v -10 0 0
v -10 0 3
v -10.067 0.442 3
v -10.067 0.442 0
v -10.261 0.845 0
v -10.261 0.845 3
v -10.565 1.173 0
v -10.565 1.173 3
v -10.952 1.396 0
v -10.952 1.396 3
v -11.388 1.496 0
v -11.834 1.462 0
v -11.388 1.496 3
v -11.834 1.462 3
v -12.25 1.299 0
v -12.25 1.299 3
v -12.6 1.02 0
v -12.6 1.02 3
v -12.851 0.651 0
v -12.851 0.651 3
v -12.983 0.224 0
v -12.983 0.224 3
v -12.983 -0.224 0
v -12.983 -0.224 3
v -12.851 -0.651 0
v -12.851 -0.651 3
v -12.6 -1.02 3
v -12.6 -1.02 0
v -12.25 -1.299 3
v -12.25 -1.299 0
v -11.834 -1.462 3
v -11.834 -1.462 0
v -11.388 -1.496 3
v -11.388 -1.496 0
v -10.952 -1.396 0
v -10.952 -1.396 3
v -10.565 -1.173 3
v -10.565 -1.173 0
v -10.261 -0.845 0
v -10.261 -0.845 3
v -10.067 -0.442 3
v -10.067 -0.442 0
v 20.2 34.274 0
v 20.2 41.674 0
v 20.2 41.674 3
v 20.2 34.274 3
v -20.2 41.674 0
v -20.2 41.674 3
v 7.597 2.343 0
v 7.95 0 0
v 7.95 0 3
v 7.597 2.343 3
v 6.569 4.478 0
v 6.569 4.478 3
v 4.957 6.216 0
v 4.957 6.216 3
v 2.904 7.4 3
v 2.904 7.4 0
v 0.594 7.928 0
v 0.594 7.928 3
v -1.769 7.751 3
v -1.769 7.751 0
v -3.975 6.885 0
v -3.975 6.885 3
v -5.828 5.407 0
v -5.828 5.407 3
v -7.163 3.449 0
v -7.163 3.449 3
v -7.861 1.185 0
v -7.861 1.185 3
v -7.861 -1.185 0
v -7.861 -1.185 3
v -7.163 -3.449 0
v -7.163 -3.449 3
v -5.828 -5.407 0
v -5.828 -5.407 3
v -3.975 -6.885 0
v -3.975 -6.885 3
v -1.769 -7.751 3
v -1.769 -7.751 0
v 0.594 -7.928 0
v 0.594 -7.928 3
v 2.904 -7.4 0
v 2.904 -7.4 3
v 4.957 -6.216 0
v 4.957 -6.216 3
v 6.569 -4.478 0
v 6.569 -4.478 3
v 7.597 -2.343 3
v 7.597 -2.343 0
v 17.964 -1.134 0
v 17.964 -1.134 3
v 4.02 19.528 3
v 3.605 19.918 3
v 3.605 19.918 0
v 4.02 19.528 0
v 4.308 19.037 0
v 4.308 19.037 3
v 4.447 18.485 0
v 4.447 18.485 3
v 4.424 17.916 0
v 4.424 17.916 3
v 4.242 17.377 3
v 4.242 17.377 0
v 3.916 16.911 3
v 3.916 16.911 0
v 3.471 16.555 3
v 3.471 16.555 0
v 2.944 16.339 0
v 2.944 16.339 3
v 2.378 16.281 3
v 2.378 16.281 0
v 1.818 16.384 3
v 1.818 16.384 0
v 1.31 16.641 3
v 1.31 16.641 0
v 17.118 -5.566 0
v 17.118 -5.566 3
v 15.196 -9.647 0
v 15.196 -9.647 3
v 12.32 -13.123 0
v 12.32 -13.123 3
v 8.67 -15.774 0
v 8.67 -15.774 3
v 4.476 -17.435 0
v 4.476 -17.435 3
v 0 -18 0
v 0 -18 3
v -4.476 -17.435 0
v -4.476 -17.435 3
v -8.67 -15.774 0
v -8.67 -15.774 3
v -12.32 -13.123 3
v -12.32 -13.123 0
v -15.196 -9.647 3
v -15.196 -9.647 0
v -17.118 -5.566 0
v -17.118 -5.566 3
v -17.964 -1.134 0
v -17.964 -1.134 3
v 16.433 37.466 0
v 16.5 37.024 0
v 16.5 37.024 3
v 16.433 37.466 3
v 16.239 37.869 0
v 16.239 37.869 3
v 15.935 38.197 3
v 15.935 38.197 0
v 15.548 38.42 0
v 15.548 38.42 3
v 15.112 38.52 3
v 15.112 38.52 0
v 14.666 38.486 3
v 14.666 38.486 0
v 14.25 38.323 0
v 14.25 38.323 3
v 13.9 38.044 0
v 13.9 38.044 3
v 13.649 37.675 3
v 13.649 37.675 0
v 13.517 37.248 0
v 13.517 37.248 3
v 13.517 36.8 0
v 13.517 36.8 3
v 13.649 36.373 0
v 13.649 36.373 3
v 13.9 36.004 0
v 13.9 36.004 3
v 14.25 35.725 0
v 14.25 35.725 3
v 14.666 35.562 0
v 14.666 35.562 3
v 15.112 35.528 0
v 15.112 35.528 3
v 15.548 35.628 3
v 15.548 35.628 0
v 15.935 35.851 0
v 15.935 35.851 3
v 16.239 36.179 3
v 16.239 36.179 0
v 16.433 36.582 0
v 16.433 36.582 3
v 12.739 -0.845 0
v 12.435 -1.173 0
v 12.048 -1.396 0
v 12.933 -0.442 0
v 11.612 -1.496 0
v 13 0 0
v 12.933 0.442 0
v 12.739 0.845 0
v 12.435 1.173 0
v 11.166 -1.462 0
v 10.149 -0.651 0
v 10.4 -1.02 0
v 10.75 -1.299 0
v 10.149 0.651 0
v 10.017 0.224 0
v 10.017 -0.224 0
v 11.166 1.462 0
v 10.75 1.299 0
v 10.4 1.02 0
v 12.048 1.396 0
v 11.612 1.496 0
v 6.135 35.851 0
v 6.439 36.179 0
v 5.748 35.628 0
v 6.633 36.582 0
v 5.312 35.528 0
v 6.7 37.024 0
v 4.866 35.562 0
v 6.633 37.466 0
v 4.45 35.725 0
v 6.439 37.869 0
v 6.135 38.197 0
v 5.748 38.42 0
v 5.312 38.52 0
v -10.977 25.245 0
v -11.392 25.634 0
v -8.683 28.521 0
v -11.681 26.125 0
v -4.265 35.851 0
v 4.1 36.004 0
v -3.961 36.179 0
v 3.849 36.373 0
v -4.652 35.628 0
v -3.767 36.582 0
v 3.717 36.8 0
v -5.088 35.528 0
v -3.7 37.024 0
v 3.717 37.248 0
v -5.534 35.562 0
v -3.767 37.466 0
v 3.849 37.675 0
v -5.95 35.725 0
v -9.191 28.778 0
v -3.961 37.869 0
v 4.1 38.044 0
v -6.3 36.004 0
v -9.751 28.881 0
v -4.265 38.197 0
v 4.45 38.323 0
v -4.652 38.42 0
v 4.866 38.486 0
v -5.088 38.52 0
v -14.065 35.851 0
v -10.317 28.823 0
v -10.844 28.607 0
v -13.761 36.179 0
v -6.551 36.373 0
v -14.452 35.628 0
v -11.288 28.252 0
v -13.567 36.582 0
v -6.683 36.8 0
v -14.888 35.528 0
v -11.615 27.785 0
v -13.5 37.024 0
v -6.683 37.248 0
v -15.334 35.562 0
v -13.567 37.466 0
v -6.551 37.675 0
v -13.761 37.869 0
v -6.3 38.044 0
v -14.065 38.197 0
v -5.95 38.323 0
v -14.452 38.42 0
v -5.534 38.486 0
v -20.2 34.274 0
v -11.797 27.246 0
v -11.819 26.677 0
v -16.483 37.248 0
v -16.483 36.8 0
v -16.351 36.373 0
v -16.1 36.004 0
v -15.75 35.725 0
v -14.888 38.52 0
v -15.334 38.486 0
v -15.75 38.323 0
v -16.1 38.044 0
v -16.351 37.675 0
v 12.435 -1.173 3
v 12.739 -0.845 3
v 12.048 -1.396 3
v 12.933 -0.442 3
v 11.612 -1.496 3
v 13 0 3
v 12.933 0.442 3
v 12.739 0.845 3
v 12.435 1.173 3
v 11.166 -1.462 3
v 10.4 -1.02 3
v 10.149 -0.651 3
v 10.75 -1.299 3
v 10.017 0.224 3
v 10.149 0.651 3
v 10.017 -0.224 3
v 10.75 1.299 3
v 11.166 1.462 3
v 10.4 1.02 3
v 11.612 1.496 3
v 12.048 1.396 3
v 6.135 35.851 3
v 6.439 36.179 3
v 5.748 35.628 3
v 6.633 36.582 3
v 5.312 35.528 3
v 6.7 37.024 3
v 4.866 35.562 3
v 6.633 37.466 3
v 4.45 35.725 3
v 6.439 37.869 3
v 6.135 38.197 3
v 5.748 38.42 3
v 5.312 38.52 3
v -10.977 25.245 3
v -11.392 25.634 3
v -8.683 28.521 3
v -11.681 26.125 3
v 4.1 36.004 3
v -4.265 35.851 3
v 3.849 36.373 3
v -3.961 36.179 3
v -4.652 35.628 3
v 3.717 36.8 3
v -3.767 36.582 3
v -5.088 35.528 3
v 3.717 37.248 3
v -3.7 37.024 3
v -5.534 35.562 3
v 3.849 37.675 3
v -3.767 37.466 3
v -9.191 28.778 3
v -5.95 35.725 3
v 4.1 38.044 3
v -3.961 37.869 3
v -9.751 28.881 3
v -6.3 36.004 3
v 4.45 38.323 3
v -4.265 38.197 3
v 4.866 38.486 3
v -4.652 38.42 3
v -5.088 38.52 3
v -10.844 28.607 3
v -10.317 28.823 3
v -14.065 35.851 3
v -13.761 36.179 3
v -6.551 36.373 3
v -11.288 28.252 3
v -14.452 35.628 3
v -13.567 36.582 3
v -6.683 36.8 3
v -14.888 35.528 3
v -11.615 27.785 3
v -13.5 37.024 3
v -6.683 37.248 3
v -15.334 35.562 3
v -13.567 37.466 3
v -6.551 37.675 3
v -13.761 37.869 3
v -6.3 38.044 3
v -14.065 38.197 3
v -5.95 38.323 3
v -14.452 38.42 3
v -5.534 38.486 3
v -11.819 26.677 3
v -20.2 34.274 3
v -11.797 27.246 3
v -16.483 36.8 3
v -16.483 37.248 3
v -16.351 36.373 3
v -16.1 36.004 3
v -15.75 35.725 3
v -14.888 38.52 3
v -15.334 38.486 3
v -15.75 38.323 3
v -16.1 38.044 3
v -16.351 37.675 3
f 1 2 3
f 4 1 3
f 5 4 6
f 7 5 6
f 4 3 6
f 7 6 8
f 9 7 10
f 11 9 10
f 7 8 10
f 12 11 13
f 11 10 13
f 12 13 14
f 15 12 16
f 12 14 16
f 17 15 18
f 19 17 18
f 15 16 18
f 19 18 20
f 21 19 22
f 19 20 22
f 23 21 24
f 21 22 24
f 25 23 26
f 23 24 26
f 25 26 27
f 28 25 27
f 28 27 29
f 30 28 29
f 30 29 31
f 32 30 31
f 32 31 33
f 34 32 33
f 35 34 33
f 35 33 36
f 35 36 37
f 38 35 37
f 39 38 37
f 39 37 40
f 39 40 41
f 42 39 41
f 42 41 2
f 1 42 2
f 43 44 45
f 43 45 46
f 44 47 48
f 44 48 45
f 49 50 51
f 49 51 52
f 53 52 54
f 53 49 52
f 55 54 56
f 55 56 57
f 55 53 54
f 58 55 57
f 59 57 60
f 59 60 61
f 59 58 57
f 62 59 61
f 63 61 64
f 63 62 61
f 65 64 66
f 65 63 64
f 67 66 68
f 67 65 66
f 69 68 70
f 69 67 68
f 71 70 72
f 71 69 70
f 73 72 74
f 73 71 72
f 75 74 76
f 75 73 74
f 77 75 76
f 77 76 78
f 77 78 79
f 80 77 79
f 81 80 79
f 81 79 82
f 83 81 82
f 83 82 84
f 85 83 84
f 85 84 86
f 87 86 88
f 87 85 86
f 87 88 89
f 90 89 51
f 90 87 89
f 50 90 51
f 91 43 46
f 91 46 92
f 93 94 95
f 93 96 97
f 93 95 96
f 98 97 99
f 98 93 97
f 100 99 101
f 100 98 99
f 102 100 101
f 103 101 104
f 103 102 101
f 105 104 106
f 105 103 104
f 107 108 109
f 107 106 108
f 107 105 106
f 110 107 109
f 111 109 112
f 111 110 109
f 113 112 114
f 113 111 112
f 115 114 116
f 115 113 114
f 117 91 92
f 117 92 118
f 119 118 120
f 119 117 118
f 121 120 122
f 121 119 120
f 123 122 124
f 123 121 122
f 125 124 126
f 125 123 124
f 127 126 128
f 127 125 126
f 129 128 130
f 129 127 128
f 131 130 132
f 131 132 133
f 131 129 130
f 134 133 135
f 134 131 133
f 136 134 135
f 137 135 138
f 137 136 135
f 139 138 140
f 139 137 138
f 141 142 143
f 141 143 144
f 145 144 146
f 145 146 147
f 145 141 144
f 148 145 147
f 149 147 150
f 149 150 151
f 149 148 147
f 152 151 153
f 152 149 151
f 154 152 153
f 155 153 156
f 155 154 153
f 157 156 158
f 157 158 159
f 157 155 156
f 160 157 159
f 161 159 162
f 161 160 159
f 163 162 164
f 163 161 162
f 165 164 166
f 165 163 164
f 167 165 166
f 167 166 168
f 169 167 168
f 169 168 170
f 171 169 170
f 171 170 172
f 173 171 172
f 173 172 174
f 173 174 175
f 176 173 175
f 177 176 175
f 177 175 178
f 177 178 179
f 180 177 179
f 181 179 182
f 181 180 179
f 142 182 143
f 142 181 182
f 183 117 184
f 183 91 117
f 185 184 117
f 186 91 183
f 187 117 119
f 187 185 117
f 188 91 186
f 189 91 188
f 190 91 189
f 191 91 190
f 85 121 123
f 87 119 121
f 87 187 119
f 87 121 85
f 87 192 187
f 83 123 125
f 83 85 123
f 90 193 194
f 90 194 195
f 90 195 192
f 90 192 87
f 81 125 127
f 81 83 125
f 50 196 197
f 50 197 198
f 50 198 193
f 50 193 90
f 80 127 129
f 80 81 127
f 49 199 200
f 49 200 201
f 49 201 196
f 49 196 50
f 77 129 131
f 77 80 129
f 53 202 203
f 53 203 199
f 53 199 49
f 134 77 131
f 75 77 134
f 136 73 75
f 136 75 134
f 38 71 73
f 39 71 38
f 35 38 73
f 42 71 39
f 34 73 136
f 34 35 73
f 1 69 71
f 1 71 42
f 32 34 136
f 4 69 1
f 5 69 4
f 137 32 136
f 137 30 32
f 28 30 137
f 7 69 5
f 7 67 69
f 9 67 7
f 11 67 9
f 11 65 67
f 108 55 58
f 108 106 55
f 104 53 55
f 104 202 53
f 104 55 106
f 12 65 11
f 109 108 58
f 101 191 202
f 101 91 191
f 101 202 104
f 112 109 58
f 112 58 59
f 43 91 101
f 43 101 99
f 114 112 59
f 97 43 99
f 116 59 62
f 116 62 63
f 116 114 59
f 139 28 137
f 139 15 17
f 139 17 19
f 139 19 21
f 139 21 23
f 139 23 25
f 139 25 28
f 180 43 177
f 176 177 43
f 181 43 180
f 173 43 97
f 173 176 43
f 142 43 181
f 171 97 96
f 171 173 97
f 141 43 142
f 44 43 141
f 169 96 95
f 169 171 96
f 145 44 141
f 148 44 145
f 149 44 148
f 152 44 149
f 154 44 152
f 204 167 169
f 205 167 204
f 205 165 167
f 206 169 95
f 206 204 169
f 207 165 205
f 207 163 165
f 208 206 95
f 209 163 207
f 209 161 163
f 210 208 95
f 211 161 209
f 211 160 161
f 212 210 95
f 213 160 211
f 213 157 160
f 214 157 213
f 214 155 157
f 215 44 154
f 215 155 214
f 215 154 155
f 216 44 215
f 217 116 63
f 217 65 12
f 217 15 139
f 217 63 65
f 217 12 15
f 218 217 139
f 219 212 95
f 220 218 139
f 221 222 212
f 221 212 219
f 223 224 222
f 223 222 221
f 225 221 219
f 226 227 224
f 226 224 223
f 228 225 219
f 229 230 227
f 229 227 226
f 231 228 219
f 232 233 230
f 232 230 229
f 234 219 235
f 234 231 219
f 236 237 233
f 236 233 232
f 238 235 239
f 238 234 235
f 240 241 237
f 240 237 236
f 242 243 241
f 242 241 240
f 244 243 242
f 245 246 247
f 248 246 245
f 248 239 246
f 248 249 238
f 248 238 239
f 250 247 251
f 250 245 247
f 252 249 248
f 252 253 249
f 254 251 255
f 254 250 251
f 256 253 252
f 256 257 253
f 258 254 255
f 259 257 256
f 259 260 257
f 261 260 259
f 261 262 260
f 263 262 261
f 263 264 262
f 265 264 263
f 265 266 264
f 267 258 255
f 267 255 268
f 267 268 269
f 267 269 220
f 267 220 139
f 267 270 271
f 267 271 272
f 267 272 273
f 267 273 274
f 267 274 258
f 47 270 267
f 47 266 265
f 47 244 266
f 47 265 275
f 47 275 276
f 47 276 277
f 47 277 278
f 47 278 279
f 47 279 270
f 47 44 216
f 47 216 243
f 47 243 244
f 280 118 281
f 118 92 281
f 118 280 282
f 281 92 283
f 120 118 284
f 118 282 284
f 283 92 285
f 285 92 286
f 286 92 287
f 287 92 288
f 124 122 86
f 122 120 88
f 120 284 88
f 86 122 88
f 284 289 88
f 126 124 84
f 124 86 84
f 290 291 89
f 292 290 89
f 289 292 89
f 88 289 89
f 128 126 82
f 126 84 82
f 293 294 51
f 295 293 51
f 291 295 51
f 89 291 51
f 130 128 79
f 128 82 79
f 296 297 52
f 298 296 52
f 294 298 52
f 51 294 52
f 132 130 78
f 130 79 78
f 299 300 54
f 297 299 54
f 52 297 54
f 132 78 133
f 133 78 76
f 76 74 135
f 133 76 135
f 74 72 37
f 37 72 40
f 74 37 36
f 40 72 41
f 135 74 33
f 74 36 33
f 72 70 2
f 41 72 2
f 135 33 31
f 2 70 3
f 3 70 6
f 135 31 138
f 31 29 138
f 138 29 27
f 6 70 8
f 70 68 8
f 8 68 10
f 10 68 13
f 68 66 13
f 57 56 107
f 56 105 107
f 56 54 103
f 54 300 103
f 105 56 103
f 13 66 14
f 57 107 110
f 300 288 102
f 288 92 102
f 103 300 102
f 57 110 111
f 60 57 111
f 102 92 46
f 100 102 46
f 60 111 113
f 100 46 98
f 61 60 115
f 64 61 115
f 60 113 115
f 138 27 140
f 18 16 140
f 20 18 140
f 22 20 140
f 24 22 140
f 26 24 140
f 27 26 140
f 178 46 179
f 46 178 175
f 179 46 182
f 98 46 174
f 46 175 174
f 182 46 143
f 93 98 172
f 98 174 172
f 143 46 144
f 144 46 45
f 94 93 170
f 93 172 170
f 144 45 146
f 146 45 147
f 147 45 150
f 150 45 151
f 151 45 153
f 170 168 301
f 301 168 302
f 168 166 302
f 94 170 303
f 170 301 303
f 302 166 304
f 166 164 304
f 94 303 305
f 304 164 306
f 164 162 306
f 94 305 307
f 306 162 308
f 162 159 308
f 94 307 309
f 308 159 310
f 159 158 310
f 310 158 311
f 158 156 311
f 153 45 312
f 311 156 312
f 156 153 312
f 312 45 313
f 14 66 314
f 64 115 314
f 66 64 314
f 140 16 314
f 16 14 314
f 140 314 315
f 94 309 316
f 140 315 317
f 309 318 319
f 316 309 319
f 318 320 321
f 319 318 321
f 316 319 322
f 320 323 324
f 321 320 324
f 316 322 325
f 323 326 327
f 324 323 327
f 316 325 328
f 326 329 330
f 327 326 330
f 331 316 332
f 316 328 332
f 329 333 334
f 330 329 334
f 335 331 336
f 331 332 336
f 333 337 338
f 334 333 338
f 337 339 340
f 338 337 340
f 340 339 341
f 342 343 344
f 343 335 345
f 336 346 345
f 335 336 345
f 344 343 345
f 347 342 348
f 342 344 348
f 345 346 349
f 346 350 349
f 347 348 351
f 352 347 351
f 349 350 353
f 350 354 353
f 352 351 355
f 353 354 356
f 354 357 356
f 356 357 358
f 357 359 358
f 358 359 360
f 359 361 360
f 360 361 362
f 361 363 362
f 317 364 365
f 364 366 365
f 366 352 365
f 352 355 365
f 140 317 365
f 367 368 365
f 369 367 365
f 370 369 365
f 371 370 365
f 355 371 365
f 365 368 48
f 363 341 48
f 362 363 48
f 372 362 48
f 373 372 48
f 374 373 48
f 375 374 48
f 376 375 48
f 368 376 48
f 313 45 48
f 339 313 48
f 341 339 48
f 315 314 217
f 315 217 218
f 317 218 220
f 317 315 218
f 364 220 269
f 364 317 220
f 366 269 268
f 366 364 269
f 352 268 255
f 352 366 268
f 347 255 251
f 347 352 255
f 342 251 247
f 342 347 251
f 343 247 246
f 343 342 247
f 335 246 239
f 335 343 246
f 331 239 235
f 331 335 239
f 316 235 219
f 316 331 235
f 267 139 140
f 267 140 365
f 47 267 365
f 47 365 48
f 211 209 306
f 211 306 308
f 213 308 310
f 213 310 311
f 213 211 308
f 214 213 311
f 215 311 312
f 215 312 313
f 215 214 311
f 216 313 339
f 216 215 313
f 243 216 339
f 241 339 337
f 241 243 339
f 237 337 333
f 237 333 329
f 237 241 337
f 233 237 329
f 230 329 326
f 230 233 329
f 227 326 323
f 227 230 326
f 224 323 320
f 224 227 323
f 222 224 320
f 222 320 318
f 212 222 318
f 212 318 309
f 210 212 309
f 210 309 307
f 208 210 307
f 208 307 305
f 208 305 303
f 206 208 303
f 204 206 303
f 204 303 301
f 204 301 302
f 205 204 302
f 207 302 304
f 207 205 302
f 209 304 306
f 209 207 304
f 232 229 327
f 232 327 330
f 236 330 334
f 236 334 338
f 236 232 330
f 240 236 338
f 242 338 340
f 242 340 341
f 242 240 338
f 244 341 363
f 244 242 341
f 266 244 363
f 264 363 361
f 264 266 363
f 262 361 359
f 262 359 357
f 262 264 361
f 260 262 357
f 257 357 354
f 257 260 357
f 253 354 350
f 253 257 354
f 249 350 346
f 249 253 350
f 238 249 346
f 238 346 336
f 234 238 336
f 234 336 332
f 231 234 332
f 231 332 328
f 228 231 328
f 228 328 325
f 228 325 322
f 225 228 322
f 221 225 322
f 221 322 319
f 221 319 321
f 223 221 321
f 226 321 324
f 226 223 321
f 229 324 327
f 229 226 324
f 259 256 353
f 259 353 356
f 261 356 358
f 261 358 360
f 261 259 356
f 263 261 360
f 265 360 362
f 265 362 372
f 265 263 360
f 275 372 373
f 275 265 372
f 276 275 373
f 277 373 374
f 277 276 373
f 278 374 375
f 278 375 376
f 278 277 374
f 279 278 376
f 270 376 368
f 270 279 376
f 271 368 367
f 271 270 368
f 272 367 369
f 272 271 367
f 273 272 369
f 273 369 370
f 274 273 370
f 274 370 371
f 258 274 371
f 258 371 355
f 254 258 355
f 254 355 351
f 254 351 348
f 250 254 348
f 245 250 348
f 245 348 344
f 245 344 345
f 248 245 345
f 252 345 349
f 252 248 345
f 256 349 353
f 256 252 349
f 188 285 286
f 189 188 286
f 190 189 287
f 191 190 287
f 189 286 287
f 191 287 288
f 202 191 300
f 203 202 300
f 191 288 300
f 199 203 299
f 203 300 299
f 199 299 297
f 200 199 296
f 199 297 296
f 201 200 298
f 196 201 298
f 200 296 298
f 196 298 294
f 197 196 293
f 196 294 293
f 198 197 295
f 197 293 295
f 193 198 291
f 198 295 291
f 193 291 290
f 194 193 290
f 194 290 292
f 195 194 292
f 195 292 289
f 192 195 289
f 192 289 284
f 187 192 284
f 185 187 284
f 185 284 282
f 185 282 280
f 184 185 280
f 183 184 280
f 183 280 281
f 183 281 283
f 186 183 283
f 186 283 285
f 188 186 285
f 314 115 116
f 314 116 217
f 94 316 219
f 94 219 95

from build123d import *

# Parameters (mm, degrees)
SKETCH1_R               = 7.95
SKETCH1_R_2             = 1.5
MAIN_BODY_LINK_B2_DEPTH = 3
CUT_EXTRUDE1_REACH      = 48.409
SKETCH2_R               = 1.5
CUT_EXTRUDE2_DEPTH      = 47.408691448


with BuildPart() as part:
    # Sketch1 → Main Body Link B2 (new body)
    with BuildSketch(Plane.XY):
        with BuildLine():
            Line((0, 41.674052381), (20.2, 41.674052381))
            Line((20.2, 41.674052381), (20.2, 34.274052381))
            Line((20.2, 34.274052381), (17.964224051, -1.134307826))
            ThreePointArc((17.964224051, -1.134307826), (0, -18), (-17.964224051, -1.134307826))
            Line((-17.964224051, -1.134307826), (-20.2, 34.274052381))
            Line((-20.2, 34.274052381), (-20.2, 41.674052381))
            Line((-20.2, 41.674052381), (0, 41.674052381))
        make_face()
        Circle(SKETCH1_R, mode=Mode.SUBTRACT)
        with Locations((-15, 37.024052381)):
            Circle(SKETCH1_R_2, mode=Mode.SUBTRACT)
        with Locations((-5.2, 37.024052381)):
            Circle(SKETCH1_R_2, mode=Mode.SUBTRACT)
        with Locations((5.2, 37.024052381)):
            Circle(SKETCH1_R_2, mode=Mode.SUBTRACT)
        with Locations((15, 37.024052381)):
            Circle(SKETCH1_R_2, mode=Mode.SUBTRACT)
    extrude(amount=MAIN_BODY_LINK_B2_DEPTH)

    # Sketch2 → Cut-Extrude1 (cut, up to next)
    with BuildSketch(Plane.XY.offset(3), mode=Mode.PRIVATE) as cut_extrude1_sk1:
        with Locations((-11.5, 0)):
            Circle(SKETCH2_R)
    cut_extrude1_tool1 = extrude(cut_extrude1_sk1.sketch, amount=-CUT_EXTRUDE1_REACH, mode=Mode.PRIVATE) & part.part
    # Sketch2 → Cut-Extrude1 (cut, up to next)
    with BuildSketch(Plane.XY.offset(3), mode=Mode.PRIVATE) as cut_extrude1_sk2:
        with Locations((11.5, 0)):
            Circle(SKETCH2_R)
    cut_extrude1_tool2 = extrude(cut_extrude1_sk2.sketch, amount=-CUT_EXTRUDE1_REACH, mode=Mode.PRIVATE) & part.part
    add(cut_extrude1_tool1.solids().sort_by_distance((-11.5, 0, 3))[0], mode=Mode.SUBTRACT)
    add(cut_extrude1_tool2.solids().sort_by_distance((11.5, 0, 3))[0], mode=Mode.SUBTRACT)

    # Sketch3 → Cut-Extrude2 (cut, through all)
    with BuildSketch(Plane.XY.offset(3)):
        with BuildLine():
            Line((-8.682671659, 28.521221325), (3.604609006, 19.91757478))
            ThreePointArc((3.604609006, 19.91757478), (4.095760221, 17.132117818), (1.31030326, 16.640966602))
            Line((1.31030326, 16.640966602), (-10.976977404, 25.244613148))
            ThreePointArc((-10.976977404, 25.244613148), (-11.46812862, 28.030070109), (-8.682671659, 28.521221325))
        make_face()
    extrude(amount=-CUT_EXTRUDE2_DEPTH, mode=Mode.SUBTRACT)


solid = part.part
